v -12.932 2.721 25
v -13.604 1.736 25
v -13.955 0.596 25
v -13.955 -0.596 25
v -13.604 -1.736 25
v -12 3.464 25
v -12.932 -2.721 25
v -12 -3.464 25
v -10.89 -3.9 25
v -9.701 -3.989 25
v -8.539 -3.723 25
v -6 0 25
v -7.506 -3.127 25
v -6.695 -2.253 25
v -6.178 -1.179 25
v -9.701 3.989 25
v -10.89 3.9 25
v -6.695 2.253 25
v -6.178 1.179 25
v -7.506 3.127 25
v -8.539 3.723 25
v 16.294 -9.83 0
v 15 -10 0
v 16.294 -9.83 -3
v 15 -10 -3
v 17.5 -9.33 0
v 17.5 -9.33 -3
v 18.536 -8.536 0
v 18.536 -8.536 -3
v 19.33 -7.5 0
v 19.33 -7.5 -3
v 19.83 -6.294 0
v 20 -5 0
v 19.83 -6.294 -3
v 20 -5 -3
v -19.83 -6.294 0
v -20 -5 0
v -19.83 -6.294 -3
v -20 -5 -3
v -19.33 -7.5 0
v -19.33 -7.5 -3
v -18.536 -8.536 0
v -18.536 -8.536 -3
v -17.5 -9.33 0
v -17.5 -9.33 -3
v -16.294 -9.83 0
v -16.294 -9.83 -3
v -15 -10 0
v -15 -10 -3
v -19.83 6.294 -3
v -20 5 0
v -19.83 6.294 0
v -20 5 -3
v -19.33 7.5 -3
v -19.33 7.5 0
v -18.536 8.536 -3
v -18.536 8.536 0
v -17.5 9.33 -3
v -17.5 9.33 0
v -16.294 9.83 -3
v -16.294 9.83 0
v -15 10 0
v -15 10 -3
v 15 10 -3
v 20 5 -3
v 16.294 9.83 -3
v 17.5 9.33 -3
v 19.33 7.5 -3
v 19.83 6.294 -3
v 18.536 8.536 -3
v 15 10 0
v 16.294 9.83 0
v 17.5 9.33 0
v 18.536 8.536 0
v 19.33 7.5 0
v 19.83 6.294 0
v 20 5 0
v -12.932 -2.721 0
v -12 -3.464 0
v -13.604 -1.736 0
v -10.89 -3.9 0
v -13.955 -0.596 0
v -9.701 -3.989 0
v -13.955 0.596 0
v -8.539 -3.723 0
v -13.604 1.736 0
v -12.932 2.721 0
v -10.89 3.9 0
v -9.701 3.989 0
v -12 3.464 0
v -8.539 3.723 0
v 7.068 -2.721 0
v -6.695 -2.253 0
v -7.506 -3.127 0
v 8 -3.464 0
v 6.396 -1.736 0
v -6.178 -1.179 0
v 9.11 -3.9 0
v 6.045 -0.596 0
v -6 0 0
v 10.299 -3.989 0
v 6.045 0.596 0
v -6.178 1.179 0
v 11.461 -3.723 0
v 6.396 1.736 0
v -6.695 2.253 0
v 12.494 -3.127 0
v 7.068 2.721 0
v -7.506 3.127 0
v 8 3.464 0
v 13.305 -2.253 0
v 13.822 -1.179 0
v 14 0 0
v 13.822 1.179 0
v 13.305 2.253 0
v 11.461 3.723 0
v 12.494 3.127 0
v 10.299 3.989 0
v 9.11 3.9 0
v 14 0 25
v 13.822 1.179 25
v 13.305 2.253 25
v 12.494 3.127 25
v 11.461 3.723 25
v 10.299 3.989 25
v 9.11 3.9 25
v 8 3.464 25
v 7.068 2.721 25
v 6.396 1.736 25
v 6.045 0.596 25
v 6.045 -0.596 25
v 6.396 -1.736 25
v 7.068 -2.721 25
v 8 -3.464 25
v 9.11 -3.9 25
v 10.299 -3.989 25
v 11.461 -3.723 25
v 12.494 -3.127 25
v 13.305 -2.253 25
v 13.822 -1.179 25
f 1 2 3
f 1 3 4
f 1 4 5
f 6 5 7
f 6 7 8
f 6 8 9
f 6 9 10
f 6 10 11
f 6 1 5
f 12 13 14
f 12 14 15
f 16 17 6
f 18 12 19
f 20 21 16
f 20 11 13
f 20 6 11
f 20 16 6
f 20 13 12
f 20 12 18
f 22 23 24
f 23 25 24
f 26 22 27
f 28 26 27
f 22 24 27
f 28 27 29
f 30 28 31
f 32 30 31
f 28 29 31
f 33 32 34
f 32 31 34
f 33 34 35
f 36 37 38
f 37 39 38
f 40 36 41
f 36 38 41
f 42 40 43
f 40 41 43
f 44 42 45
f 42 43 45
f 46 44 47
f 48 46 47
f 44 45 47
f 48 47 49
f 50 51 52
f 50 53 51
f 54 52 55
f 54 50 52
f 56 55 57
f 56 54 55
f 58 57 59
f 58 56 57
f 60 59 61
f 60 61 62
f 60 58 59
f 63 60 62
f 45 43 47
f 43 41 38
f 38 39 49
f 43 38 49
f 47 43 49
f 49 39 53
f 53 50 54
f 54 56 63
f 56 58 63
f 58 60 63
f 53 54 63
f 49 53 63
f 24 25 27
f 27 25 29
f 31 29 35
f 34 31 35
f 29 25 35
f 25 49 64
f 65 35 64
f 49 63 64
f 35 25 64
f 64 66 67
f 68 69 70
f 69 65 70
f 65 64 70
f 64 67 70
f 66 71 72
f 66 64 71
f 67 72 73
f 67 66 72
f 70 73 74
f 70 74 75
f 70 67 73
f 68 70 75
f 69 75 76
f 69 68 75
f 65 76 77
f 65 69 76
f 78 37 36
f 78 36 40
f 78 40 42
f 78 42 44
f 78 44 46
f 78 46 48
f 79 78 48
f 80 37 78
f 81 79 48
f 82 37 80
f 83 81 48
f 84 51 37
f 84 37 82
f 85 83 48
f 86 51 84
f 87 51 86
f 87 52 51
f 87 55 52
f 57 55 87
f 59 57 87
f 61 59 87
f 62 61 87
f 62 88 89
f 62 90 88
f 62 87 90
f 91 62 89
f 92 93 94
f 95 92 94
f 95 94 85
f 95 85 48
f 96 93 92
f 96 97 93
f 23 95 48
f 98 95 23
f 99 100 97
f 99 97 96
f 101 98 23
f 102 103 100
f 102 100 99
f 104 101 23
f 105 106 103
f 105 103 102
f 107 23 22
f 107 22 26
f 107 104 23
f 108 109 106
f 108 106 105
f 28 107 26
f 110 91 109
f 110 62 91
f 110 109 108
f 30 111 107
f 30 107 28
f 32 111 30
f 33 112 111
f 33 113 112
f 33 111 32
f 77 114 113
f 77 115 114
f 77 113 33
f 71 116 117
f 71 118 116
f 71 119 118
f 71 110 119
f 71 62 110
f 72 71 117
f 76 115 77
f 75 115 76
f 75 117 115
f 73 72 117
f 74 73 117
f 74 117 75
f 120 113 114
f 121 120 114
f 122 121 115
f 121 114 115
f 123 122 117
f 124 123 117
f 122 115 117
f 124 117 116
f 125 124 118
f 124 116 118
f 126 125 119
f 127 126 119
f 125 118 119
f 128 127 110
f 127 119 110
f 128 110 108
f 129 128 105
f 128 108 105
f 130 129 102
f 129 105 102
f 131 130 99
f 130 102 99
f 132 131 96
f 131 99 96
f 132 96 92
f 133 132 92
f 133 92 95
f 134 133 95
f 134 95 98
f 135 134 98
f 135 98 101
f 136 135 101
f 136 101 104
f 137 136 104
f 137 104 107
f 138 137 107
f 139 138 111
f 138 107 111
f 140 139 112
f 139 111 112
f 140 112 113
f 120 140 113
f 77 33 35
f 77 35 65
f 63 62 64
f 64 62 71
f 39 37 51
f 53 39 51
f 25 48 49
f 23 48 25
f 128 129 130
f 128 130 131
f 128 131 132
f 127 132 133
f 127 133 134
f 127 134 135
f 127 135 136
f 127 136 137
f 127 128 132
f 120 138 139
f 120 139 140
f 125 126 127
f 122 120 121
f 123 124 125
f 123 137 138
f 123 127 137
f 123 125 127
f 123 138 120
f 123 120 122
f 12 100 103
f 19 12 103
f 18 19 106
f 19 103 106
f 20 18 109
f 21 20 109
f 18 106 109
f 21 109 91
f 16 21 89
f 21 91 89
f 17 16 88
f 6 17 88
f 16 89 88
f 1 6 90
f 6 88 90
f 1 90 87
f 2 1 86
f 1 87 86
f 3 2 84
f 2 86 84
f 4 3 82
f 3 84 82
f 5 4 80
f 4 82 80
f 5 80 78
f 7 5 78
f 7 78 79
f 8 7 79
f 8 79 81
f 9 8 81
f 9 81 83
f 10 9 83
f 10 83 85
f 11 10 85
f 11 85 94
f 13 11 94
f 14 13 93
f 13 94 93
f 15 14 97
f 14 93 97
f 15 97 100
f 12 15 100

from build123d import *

# Parameters (mm, degrees)
F0_W     = 40
F0_H     = 20
F0_R     = 4
F1_DEPTH = 3
F2_R     = 4
F3_DEPTH = 25
F4_R     = 5


with BuildPart() as f1:
    # F0 (on Top) → F1 (new body)
    with BuildSketch(Plane.XY):
        Rectangle(F0_W, F0_H)
        with Locations((-10, 0)):
            Circle(F0_R, mode=Mode.SUBTRACT)
        with Locations((10, 0)):
            Circle(F0_R, mode=Mode.SUBTRACT)
        with Locations((-10, 0)):
            Circle(F0_R)
        with Locations((10, 0)):
            Circle(F0_R)
    extrude(amount=-F1_DEPTH)

    # F2 (on face) → F3 (join)
    with BuildSketch(Plane.XY):
        with Locations((-10, 0)):
            Circle(F2_R)
        with Locations((10, 0)):
            Circle(F2_R)
    extrude(amount=F3_DEPTH)

    # F4
    f4_edges = [f1.edges().sort_by_distance(p)[0] for p in [
        (-20, -10, -1.5),
        (-20, 10, -1.5),
        (20, 10, -1.5),
        (20, -10, -1.5),
    ]]
    fillet(f4_edges, radius=F4_R)


solid = f1.part
